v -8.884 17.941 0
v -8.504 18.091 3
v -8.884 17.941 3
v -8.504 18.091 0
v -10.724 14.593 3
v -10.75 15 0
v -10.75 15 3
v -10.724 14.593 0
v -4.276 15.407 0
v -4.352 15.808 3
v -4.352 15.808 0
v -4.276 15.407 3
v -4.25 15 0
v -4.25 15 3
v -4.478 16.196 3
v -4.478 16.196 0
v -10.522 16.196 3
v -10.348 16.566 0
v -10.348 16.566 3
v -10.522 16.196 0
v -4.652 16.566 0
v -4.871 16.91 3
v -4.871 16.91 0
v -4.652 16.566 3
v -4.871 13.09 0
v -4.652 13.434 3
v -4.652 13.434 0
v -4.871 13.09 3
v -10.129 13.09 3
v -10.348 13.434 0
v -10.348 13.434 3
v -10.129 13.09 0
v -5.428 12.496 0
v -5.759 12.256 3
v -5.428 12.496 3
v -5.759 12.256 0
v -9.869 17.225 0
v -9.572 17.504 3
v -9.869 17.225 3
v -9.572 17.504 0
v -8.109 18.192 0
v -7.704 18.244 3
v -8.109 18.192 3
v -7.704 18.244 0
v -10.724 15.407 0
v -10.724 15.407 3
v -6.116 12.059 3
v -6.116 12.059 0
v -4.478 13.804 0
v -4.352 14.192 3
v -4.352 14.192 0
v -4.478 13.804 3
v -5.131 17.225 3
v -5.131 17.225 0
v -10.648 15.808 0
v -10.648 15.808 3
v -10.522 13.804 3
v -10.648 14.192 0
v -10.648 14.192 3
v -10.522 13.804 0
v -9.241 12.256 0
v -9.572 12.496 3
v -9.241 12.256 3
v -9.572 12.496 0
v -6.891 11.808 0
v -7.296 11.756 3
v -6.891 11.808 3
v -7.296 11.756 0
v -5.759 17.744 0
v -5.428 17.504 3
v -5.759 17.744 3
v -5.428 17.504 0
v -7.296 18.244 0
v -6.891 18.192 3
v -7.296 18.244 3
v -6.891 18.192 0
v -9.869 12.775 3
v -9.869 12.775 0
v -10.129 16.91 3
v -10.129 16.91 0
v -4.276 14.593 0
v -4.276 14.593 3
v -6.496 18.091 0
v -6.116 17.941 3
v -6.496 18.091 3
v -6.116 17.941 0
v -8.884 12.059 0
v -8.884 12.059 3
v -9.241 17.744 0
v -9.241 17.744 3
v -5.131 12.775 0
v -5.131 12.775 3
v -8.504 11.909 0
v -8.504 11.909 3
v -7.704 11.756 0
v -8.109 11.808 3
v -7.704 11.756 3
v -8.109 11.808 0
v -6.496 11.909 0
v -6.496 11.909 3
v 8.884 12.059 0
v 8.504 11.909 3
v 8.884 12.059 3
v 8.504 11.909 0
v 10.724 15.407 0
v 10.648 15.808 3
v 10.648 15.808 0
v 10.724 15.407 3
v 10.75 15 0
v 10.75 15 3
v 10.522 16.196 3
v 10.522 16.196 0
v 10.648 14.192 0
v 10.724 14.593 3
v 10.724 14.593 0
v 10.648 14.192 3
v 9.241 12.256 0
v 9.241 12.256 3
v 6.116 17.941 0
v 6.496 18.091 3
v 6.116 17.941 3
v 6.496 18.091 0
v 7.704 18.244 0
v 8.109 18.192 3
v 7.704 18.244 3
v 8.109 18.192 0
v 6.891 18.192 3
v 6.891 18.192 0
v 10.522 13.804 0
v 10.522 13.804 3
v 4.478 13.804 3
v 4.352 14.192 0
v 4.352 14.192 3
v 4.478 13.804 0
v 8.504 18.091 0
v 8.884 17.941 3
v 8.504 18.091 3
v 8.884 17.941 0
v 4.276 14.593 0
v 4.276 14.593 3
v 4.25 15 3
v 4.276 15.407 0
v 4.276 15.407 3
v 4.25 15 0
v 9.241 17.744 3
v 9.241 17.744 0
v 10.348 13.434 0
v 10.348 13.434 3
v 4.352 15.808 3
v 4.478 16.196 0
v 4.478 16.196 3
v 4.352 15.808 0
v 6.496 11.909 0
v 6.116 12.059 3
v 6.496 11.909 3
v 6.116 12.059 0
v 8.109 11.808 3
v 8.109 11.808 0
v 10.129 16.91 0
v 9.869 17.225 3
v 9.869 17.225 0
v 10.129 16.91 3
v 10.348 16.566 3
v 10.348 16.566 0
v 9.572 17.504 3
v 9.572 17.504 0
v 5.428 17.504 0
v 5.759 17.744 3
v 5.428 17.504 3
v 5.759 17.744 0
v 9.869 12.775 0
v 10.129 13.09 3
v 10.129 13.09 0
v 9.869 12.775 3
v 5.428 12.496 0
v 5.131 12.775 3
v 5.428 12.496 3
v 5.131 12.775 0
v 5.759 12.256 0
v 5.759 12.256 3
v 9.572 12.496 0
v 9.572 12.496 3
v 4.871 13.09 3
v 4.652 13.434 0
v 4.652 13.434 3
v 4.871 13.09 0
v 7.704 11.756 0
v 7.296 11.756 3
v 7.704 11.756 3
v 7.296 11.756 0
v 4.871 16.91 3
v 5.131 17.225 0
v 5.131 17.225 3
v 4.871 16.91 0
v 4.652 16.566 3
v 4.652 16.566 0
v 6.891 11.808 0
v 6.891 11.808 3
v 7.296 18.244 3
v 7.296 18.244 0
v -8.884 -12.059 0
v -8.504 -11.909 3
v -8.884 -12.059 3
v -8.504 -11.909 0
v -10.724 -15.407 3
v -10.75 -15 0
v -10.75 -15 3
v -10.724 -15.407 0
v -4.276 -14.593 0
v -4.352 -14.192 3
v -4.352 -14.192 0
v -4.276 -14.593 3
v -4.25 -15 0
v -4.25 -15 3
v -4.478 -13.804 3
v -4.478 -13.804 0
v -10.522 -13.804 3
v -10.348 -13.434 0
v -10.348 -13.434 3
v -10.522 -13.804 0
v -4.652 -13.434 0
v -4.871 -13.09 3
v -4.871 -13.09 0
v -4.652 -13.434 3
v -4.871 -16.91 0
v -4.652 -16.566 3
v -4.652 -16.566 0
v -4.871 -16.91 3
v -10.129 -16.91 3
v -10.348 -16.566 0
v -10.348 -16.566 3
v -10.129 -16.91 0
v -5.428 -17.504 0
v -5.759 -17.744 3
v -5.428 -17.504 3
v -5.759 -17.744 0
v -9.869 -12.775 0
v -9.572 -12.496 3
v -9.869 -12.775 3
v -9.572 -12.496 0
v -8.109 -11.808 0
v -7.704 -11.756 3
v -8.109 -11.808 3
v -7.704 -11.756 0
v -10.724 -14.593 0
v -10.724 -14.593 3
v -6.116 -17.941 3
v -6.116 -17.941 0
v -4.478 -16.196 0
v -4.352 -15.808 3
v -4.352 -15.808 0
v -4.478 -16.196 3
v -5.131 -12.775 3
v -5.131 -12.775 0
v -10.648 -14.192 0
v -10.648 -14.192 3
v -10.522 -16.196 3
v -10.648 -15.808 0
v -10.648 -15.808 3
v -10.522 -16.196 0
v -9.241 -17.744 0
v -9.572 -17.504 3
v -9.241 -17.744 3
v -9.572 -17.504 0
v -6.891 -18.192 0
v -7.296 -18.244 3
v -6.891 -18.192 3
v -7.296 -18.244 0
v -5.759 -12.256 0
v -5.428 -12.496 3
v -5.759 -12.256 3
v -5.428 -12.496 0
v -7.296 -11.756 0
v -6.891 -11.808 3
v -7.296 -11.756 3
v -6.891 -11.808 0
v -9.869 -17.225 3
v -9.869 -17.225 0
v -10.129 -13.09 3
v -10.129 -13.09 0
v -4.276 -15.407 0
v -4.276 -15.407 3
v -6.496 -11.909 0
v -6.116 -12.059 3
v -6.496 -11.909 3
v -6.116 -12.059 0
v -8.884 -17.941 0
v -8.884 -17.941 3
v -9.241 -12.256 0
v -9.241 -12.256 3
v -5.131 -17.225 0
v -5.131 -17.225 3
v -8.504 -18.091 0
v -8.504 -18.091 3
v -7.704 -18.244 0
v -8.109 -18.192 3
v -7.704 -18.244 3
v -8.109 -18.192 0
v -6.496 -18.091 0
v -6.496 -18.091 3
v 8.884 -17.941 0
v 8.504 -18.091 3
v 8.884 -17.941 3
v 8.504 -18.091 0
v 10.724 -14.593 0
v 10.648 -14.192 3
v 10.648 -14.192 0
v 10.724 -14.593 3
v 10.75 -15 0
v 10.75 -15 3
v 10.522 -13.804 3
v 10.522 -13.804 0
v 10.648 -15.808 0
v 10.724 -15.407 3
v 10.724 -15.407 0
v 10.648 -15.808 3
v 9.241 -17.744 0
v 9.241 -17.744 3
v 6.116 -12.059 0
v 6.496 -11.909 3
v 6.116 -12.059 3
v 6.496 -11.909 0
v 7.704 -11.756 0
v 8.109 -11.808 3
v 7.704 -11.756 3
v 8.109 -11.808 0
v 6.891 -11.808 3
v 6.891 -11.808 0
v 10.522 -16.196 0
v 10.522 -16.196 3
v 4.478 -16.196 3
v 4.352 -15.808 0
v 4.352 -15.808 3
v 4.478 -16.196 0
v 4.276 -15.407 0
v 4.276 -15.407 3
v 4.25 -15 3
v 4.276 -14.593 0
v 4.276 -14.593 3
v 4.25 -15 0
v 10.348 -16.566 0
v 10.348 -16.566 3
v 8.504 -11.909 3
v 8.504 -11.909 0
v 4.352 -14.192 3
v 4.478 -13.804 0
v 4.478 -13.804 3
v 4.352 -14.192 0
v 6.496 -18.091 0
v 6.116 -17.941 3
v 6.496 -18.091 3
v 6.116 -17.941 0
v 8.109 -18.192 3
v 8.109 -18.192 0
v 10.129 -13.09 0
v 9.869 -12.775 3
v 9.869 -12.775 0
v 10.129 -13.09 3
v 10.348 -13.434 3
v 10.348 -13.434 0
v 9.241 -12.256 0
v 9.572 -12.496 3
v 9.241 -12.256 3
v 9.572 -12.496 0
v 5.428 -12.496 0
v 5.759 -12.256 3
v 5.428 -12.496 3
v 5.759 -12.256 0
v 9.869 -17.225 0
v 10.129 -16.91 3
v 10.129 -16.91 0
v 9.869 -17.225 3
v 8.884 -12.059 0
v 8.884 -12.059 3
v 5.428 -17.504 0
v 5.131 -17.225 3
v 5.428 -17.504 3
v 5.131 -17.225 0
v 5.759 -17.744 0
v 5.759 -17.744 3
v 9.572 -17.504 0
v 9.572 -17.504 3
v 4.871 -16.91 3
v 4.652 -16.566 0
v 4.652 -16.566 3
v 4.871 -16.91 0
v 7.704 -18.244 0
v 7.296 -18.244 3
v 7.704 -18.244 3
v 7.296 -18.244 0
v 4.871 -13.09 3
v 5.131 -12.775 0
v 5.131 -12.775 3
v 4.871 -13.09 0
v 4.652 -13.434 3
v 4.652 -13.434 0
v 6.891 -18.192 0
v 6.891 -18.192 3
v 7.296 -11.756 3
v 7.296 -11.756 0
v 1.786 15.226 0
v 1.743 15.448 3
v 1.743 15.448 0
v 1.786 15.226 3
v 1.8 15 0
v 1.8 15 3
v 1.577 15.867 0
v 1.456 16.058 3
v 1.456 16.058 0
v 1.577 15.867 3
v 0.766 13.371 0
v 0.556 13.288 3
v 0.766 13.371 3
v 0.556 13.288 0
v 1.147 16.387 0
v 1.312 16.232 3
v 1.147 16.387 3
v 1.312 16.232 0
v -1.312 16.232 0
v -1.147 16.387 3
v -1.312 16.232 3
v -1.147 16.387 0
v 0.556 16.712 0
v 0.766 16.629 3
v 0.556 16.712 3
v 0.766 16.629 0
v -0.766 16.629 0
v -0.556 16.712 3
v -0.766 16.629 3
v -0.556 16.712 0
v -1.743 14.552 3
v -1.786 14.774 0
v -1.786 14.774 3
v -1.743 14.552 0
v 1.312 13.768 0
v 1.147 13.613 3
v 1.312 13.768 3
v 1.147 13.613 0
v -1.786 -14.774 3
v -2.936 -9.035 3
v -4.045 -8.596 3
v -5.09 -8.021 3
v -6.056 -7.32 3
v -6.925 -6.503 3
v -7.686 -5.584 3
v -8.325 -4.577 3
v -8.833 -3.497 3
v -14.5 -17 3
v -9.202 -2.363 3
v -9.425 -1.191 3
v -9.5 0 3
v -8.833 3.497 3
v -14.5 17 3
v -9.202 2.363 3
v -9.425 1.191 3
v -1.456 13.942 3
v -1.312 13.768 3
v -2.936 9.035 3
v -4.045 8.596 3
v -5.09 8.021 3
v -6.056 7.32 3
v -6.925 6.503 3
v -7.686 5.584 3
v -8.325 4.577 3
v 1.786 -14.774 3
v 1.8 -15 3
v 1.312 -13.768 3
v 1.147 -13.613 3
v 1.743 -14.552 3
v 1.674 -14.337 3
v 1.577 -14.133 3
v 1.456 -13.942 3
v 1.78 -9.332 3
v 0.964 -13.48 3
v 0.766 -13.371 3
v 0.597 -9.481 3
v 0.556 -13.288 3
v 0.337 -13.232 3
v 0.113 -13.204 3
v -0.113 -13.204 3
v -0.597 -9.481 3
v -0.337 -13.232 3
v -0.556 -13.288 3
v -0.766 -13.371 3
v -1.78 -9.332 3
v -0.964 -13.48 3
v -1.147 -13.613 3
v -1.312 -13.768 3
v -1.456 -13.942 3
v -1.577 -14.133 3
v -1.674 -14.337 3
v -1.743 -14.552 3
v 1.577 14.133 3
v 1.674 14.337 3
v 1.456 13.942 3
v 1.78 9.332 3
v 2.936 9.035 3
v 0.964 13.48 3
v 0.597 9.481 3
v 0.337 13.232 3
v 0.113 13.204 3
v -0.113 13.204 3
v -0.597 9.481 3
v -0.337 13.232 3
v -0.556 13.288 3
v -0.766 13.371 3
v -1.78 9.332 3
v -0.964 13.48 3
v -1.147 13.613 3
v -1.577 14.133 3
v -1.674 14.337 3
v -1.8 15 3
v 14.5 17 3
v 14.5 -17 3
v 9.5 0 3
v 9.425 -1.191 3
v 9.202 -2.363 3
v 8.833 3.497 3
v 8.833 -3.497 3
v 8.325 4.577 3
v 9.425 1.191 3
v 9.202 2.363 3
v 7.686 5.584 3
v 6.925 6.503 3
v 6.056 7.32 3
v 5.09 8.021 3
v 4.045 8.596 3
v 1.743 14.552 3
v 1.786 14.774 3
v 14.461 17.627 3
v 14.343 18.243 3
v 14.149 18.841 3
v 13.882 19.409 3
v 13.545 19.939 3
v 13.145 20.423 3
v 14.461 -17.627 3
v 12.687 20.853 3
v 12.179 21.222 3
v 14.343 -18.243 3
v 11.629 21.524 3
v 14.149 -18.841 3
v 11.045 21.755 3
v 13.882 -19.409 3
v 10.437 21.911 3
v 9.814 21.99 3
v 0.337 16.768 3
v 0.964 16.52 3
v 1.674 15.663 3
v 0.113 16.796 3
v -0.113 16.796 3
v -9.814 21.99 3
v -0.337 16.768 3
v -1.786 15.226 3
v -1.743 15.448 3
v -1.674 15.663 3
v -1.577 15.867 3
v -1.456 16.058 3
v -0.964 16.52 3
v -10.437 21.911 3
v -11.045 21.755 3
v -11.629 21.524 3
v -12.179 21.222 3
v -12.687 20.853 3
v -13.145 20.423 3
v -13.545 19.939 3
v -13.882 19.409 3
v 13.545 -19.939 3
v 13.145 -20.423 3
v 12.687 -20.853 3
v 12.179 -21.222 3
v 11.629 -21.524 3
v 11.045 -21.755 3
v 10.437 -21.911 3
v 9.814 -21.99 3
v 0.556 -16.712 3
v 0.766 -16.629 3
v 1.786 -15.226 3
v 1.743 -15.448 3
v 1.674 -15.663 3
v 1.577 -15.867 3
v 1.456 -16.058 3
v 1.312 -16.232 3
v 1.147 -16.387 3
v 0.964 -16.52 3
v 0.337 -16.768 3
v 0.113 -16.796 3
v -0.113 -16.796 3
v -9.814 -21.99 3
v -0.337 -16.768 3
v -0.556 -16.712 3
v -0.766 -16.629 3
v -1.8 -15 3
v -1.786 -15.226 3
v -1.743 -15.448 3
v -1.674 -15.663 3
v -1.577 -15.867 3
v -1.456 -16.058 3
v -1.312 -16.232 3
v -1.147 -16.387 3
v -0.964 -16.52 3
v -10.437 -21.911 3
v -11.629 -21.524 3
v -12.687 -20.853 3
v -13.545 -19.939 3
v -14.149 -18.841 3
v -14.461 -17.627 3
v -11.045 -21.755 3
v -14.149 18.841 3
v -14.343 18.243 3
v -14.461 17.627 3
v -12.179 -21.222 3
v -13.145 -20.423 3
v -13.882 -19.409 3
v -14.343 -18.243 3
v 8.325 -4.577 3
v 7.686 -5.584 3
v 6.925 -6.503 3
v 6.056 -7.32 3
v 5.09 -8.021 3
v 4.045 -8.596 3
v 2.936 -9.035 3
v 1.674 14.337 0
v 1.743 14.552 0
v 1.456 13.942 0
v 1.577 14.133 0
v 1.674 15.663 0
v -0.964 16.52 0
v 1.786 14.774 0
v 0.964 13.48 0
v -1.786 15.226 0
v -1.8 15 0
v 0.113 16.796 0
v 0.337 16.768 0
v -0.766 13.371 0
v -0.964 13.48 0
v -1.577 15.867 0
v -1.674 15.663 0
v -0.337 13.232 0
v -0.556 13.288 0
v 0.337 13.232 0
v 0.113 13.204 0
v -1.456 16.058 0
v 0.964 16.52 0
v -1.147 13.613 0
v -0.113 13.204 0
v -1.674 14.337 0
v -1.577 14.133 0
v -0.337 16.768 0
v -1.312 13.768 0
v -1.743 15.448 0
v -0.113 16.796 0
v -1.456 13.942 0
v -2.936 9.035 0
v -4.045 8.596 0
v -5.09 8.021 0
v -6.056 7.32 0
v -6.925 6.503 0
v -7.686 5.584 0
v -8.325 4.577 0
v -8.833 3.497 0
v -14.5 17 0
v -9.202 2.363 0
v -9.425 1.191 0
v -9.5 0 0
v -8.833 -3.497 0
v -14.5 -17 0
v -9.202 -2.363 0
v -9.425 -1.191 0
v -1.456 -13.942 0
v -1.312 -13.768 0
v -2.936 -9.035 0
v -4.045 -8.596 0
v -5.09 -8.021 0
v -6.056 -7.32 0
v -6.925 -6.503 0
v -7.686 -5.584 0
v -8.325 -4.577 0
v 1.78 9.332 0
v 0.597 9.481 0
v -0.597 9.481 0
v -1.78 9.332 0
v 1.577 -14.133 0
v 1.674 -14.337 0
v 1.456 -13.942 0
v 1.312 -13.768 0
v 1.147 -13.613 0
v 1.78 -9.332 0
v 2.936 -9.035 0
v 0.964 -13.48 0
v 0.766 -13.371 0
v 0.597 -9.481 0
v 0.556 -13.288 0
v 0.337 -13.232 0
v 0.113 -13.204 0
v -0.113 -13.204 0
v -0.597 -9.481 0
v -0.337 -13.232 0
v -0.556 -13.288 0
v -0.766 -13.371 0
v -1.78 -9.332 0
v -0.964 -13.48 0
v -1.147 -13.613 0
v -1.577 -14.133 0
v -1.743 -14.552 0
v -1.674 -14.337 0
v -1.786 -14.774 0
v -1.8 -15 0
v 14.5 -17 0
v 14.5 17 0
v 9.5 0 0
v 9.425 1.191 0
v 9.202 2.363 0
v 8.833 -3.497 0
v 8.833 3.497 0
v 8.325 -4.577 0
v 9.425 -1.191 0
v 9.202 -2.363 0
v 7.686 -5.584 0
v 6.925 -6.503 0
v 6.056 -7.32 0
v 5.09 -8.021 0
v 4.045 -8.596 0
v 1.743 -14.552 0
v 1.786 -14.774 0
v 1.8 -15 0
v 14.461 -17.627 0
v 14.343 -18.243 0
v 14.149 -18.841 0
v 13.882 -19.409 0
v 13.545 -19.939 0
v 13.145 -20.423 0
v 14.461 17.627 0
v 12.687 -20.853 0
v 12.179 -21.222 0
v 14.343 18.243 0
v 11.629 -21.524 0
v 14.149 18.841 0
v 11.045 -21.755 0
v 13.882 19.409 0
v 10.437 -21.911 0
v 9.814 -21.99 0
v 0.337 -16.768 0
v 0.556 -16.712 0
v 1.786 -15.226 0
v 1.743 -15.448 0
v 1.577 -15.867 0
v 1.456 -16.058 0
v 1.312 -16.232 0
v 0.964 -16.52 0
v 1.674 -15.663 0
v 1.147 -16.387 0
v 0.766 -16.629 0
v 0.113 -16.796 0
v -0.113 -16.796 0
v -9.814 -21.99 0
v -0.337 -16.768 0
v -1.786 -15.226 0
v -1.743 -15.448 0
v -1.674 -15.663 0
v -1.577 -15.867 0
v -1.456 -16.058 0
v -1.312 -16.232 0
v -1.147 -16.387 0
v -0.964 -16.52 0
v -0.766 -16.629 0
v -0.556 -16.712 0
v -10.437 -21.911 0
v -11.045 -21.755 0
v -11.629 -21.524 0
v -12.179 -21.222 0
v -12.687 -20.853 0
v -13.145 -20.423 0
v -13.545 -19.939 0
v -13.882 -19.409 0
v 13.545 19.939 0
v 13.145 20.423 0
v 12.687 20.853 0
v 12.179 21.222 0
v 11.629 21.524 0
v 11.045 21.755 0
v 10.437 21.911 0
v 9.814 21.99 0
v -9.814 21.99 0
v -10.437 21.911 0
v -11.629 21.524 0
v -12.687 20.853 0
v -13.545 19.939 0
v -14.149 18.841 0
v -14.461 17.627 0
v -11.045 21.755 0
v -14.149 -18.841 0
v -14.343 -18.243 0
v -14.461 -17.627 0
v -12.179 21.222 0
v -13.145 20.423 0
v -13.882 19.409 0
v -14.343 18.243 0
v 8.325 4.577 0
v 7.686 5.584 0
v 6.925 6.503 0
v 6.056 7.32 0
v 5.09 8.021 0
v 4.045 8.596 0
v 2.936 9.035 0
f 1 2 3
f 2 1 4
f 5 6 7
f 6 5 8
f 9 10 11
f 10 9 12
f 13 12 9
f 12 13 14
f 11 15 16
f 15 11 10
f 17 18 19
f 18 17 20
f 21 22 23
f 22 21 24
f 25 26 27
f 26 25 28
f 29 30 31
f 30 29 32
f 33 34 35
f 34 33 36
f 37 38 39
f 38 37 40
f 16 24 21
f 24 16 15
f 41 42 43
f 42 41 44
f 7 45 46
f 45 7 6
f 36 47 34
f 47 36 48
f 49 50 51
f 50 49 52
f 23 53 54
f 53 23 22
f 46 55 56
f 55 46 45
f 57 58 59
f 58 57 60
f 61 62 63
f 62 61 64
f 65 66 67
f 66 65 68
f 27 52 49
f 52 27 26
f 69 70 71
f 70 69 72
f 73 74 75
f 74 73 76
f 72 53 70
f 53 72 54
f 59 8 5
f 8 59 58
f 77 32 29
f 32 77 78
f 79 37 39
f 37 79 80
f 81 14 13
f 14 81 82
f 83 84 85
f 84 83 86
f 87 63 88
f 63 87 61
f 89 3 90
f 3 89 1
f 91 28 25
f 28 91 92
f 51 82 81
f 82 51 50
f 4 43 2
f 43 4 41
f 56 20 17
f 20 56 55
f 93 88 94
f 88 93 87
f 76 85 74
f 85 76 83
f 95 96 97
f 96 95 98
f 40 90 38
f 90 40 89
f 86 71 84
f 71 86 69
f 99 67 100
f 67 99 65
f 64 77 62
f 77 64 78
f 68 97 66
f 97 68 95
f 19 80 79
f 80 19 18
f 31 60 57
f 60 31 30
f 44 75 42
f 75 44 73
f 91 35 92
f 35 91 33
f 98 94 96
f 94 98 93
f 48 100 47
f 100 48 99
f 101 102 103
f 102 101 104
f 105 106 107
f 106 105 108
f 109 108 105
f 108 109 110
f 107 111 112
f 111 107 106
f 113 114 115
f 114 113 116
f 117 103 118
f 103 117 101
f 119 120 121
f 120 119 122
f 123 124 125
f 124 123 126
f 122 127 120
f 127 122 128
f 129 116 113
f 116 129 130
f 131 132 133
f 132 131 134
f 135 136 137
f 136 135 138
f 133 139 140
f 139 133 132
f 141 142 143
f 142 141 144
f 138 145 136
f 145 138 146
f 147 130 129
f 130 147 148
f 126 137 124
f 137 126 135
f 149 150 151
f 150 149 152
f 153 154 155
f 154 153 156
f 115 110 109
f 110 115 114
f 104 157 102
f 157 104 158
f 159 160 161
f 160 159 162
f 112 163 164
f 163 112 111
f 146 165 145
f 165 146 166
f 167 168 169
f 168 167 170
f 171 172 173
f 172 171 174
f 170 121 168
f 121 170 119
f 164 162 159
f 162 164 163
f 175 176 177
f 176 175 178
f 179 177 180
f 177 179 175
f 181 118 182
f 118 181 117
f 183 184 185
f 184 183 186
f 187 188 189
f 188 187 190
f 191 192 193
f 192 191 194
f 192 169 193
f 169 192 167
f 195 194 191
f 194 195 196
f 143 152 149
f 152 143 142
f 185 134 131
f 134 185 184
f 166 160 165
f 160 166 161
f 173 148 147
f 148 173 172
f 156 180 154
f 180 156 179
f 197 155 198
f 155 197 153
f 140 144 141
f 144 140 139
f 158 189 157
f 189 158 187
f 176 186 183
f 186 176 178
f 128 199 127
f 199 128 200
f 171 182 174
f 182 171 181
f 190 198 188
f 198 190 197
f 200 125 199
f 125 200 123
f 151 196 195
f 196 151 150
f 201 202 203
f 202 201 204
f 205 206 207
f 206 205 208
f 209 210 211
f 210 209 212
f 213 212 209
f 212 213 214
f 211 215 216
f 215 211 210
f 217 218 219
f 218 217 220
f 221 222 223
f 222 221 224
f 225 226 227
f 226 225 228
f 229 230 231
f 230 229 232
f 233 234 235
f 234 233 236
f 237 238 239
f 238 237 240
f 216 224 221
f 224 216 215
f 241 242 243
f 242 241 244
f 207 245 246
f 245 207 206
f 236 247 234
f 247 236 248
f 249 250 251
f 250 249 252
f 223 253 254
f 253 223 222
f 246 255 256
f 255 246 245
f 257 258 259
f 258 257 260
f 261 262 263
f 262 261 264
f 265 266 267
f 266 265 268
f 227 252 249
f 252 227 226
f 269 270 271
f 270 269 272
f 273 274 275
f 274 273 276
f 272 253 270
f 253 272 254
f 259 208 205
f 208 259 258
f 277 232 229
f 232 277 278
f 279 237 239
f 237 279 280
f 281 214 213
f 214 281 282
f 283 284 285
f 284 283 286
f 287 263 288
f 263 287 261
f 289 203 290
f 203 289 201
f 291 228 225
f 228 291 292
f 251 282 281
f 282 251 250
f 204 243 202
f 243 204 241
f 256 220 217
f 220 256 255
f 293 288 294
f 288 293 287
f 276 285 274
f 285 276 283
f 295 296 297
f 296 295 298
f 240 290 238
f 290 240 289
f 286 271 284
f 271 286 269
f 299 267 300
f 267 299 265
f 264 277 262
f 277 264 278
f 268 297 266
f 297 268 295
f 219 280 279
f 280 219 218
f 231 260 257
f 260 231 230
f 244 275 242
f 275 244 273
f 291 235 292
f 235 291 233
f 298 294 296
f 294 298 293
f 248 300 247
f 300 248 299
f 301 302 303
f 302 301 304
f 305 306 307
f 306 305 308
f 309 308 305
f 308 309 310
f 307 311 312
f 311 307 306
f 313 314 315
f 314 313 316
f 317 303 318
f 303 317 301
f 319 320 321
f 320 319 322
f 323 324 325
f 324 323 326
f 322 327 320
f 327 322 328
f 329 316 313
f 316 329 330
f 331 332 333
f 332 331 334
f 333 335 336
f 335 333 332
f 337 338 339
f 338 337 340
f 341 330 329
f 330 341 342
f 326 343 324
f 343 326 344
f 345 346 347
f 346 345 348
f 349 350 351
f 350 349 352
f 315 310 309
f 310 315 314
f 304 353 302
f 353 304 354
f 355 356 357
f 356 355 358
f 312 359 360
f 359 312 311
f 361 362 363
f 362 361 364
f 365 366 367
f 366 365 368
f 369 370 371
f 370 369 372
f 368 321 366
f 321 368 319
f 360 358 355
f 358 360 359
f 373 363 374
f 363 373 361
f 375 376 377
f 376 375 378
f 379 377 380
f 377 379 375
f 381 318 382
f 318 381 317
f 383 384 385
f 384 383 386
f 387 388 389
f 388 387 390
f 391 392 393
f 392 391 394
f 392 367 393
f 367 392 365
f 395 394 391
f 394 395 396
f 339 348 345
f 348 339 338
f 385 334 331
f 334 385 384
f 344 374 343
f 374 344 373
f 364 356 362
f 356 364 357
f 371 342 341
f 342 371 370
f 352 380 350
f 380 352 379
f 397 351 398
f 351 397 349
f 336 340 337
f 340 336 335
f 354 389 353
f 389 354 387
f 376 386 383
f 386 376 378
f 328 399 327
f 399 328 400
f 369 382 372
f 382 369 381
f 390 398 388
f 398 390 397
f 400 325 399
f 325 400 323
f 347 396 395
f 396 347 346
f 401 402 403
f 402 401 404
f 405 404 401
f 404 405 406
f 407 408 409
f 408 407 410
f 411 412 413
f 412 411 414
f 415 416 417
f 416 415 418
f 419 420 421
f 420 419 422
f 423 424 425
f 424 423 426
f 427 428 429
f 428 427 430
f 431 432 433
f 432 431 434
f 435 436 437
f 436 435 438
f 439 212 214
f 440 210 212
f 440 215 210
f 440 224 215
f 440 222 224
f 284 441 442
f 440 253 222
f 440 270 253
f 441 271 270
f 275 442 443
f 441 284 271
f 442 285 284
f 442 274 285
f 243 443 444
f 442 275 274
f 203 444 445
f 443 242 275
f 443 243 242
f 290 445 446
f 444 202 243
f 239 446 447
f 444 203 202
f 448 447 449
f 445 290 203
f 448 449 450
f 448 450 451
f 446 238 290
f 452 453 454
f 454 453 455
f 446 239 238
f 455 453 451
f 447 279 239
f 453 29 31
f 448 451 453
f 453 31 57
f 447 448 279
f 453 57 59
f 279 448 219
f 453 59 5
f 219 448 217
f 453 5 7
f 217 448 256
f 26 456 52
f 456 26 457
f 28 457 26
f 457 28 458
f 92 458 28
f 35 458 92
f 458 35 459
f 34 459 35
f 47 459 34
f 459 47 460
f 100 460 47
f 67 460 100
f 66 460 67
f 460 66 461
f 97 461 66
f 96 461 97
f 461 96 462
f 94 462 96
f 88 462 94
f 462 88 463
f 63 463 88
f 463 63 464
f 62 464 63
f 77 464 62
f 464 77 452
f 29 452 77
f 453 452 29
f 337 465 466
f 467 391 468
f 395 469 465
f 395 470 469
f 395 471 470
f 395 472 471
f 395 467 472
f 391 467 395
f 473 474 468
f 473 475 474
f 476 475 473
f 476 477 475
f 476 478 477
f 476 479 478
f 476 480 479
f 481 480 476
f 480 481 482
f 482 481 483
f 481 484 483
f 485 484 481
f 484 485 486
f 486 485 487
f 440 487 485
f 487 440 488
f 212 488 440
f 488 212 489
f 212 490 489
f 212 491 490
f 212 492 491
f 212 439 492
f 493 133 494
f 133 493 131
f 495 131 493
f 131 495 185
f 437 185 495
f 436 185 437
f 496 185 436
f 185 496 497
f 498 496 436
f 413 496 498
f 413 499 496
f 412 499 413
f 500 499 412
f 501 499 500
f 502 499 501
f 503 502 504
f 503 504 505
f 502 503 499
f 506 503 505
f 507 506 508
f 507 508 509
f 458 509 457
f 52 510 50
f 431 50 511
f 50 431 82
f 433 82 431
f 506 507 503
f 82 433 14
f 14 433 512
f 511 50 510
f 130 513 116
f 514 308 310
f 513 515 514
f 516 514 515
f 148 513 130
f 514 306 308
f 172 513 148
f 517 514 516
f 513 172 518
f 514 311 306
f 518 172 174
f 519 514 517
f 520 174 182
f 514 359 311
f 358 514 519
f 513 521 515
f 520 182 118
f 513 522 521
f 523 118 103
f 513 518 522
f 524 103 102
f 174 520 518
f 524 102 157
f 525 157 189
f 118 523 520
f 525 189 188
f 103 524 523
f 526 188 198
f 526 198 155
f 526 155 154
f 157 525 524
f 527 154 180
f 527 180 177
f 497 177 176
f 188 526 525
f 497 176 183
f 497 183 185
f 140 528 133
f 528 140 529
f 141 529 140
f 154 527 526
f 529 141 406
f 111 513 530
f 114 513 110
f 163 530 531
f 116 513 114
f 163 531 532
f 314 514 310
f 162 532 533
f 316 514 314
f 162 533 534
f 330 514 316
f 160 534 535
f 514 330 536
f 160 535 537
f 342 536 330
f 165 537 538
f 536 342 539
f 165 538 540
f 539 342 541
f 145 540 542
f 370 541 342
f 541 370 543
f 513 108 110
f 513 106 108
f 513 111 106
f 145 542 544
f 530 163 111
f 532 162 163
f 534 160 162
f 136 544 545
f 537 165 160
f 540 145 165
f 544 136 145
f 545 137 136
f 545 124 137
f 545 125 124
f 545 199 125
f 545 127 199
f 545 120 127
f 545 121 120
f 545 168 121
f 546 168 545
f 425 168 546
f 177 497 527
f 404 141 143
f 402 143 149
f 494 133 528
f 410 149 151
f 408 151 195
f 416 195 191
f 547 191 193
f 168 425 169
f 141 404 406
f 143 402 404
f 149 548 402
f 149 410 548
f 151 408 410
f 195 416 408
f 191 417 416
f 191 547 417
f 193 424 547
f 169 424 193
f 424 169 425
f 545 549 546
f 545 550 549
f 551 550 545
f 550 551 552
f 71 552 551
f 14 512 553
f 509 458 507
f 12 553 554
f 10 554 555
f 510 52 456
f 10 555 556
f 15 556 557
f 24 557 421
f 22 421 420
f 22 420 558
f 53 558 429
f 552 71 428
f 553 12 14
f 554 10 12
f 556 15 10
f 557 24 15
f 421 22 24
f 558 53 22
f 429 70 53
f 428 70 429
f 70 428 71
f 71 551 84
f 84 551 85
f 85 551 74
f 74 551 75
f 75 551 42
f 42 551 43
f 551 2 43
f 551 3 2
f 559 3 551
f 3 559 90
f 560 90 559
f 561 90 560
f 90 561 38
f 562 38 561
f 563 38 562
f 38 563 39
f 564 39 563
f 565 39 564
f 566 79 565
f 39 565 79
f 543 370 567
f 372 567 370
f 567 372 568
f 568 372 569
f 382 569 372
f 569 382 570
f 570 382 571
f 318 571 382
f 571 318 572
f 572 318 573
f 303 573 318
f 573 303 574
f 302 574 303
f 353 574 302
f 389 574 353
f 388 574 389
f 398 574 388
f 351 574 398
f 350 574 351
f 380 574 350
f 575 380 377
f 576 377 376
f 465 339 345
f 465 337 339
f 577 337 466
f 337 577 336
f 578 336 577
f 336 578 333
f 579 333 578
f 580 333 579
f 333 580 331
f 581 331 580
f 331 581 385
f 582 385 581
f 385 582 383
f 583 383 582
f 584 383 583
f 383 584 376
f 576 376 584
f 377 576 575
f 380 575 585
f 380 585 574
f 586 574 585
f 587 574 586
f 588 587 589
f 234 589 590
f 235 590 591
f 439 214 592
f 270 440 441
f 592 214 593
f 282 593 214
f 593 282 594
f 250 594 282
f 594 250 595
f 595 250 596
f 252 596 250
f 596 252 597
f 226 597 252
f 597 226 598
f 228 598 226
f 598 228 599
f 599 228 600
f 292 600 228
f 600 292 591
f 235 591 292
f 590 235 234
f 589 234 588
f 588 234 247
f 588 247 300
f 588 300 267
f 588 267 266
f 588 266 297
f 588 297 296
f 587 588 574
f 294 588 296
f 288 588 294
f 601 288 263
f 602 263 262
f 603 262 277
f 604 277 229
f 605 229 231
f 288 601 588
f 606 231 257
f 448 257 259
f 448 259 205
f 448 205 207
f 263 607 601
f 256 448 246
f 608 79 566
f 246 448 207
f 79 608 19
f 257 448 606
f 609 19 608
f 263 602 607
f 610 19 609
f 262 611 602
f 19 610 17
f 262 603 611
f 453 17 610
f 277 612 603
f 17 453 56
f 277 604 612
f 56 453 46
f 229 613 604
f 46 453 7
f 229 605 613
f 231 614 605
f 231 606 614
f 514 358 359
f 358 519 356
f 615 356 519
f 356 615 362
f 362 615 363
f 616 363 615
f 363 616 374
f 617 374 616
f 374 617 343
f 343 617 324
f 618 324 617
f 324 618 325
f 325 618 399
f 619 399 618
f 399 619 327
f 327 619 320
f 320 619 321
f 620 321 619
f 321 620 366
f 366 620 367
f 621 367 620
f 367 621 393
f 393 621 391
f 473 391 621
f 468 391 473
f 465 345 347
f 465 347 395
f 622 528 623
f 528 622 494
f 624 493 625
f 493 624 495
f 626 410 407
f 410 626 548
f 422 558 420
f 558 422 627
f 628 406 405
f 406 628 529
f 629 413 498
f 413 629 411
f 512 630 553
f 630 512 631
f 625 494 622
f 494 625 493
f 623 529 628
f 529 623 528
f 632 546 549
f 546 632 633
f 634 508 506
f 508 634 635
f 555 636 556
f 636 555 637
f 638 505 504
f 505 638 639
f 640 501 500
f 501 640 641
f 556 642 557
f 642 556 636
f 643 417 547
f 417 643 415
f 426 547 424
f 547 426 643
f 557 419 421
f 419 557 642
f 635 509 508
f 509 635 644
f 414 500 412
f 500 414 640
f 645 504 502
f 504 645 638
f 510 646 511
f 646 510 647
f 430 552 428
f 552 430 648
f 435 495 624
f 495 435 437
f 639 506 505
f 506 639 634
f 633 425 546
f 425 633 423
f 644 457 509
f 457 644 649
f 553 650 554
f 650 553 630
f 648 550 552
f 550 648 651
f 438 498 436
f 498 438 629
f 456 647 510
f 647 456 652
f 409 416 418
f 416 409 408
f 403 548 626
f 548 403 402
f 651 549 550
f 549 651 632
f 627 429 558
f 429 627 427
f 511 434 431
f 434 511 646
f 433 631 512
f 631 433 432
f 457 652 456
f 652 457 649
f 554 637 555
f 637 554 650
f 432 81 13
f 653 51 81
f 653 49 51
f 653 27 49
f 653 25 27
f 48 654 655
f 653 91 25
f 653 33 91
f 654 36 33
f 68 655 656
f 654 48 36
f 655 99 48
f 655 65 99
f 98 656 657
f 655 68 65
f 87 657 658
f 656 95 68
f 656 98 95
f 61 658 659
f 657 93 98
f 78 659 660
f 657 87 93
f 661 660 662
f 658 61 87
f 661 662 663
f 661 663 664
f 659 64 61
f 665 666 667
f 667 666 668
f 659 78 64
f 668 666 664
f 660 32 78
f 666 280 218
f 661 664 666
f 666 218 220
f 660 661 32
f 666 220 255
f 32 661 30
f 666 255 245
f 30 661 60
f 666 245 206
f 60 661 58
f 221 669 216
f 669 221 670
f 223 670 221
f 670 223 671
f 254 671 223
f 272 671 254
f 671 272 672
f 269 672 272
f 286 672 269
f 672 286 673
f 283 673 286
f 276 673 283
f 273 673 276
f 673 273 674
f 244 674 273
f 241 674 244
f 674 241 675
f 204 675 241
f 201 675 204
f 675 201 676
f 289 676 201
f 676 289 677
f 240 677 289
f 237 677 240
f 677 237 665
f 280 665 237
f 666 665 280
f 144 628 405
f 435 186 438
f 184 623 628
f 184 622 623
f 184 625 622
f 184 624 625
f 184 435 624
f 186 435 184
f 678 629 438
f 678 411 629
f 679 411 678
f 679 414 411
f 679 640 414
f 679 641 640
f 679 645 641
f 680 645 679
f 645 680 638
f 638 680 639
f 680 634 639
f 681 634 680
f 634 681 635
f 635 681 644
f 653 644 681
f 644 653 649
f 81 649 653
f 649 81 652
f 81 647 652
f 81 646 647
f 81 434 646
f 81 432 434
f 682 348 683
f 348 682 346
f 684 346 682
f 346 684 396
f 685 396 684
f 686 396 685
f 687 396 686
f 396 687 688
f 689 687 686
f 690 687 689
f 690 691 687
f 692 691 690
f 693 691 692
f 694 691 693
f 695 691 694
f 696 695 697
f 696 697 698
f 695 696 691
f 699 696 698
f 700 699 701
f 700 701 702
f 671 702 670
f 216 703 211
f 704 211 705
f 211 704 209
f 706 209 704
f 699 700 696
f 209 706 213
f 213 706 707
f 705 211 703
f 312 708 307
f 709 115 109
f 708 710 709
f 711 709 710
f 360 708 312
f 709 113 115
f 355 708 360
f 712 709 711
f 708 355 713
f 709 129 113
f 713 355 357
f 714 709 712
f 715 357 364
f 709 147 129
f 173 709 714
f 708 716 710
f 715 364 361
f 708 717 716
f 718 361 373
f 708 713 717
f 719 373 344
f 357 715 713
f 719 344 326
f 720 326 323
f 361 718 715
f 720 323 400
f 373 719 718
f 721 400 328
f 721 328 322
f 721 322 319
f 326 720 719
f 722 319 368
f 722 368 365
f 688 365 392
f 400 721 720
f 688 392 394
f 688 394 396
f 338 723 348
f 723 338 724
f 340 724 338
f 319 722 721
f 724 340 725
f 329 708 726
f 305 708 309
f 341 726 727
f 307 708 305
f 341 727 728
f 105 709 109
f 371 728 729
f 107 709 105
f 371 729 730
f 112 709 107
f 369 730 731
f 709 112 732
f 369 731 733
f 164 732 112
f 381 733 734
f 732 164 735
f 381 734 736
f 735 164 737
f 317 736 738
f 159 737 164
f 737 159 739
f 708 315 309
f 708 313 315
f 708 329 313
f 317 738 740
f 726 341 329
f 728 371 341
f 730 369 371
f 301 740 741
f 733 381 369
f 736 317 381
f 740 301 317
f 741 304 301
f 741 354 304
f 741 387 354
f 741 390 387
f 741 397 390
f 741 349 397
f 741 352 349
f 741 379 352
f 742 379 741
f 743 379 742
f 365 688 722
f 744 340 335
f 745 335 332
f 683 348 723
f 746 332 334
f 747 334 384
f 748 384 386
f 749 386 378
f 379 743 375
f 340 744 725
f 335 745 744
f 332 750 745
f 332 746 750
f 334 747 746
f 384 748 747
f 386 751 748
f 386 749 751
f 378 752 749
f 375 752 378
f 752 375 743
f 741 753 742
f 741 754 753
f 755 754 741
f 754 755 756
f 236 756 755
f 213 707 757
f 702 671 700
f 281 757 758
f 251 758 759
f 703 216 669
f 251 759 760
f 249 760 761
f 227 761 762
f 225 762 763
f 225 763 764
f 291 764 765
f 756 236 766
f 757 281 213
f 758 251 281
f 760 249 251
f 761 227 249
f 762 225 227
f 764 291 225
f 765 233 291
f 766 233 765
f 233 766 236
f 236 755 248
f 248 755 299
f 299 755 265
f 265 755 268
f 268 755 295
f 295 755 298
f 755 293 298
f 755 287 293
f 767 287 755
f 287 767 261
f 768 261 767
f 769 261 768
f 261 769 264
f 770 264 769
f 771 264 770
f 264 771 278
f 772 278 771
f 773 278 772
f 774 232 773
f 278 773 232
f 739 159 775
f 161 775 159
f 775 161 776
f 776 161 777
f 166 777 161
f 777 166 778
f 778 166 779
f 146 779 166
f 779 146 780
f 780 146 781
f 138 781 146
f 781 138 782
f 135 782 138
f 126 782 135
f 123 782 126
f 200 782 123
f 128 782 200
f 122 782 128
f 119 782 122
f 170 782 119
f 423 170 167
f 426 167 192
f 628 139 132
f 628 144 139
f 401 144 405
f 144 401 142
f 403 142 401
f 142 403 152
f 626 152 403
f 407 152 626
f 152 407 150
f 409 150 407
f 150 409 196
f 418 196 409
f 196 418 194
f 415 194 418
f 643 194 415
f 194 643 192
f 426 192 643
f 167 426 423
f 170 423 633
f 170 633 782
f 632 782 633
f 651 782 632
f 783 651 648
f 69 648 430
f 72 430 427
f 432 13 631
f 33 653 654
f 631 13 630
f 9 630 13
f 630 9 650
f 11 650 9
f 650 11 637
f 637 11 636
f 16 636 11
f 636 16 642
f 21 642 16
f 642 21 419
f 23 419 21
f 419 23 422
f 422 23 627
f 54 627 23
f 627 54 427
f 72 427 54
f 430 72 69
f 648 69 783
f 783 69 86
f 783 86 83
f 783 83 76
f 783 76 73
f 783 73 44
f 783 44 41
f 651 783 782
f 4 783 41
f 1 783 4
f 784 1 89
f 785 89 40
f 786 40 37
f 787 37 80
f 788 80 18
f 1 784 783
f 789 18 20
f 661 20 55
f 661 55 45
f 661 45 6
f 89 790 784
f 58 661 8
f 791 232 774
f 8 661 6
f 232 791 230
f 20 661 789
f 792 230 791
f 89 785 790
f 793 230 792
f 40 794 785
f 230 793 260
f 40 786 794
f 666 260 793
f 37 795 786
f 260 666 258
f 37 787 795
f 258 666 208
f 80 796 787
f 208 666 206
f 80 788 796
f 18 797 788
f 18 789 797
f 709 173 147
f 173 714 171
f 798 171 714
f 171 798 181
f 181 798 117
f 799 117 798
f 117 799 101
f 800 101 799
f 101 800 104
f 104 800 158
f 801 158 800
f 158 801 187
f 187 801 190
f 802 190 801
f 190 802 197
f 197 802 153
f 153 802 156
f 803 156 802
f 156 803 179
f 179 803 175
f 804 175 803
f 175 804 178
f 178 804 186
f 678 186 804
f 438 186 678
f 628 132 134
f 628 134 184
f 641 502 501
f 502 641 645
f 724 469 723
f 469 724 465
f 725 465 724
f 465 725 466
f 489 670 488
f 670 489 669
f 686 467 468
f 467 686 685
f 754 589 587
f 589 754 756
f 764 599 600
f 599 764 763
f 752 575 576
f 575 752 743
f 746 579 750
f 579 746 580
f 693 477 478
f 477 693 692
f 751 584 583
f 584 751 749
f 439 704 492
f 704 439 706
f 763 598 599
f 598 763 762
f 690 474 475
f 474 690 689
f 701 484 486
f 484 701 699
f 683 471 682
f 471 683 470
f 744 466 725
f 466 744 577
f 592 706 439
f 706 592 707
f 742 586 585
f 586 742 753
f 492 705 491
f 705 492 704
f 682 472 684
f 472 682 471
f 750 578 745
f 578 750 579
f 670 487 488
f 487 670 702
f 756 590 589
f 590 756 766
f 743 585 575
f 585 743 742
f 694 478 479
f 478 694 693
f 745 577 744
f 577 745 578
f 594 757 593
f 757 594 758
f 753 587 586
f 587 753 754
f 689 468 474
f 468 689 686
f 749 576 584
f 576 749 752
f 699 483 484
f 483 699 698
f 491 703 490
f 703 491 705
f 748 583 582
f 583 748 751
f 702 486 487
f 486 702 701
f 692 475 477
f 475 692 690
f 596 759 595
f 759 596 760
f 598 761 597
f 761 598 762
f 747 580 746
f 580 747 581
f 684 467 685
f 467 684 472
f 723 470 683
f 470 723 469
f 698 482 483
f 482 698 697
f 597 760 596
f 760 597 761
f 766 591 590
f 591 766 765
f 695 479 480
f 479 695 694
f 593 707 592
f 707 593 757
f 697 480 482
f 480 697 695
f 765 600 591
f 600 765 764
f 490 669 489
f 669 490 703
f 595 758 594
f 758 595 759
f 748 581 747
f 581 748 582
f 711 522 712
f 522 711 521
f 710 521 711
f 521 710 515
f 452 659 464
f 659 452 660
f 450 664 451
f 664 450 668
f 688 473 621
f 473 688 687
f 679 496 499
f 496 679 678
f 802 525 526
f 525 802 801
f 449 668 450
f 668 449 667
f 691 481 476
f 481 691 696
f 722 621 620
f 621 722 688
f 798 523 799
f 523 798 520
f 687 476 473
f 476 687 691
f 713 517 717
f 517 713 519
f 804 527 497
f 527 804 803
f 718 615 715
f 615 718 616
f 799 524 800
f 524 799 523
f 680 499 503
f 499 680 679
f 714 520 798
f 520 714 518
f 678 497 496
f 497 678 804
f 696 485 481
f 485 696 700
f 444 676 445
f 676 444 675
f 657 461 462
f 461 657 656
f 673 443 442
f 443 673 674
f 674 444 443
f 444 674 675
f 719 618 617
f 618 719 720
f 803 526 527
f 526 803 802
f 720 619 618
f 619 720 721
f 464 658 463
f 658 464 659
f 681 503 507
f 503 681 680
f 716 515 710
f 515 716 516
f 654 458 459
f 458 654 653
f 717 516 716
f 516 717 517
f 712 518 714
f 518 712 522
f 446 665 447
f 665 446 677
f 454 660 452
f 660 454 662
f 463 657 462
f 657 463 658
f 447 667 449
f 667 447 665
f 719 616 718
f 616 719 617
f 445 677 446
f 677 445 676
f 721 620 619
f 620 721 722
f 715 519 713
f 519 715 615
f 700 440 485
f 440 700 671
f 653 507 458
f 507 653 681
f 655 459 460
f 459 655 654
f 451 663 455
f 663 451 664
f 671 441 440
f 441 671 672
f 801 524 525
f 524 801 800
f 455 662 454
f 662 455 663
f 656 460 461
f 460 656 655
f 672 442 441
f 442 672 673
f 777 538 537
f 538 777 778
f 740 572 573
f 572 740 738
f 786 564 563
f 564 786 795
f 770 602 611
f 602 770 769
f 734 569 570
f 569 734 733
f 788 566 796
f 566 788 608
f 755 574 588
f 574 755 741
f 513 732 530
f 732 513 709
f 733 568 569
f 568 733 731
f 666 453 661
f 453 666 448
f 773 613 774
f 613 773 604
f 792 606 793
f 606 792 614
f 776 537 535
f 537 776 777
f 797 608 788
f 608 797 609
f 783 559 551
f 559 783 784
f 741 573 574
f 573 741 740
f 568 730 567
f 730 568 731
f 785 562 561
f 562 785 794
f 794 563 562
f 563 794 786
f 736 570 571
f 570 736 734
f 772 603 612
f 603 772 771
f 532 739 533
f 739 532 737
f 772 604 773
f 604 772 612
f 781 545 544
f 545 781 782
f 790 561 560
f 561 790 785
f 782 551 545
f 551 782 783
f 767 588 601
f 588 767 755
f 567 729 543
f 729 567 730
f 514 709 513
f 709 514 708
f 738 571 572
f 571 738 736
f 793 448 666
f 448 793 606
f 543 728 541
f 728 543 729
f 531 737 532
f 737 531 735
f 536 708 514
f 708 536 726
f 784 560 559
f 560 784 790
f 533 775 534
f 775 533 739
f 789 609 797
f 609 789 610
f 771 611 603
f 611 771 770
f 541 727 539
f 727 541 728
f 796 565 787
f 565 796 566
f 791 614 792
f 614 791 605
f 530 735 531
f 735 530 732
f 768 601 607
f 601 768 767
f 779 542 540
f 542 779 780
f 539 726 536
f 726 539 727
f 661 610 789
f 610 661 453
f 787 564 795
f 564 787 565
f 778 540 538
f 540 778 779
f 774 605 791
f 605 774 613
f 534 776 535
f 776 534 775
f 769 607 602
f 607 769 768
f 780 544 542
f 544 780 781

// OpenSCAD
$fn = 50;


difference() {
	union() {
		hull() {
			translate(v = [-9.5000000000, 17.0000000000, 0]) {
				cylinder(h = 3, r = 5);
			}
			translate(v = [9.5000000000, 17.0000000000, 0]) {
				cylinder(h = 3, r = 5);
			}
			translate(v = [-9.5000000000, -17.0000000000, 0]) {
				cylinder(h = 3, r = 5);
			}
			translate(v = [9.5000000000, -17.0000000000, 0]) {
				cylinder(h = 3, r = 5);
			}
		}
	}
	union() {
		#translate(v = [-7.5000000000, 15.0000000000, 0]) {
			cylinder(h = 3, r = 3.2500000000);
		}
		#translate(v = [7.5000000000, 15.0000000000, 0]) {
			cylinder(h = 3, r = 3.2500000000);
		}
		#translate(v = [-7.5000000000, -15.0000000000, 0]) {
			cylinder(h = 3, r = 3.2500000000);
		}
		#translate(v = [7.5000000000, -15.0000000000, 0]) {
			cylinder(h = 3, r = 3.2500000000);
		}
		#translate(v = [-7.5000000000, -15.0000000000, -100.0000000000]) {
			cylinder(h = 200, r = 3.2500000000);
		}
		#translate(v = [-7.5000000000, 15.0000000000, -100.0000000000]) {
			cylinder(h = 200, r = 3.2500000000);
		}
		#translate(v = [7.5000000000, -15.0000000000, -100.0000000000]) {
			cylinder(h = 200, r = 3.2500000000);
		}
		#translate(v = [7.5000000000, 15.0000000000, -100.0000000000]) {
			cylinder(h = 200, r = 3.2500000000);
		}
		#translate(v = [-7.5000000000, 15.0000000000, 0]) {
			cylinder(h = 3, r = 1.8000000000);
		}
		#translate(v = [0.0000000000, 15.0000000000, 0]) {
			cylinder(h = 3, r = 1.8000000000);
		}
		#translate(v = [7.5000000000, 15.0000000000, 0]) {
			cylinder(h = 3, r = 1.8000000000);
		}
		#translate(v = [-7.5000000000, -15.0000000000, 0]) {
			cylinder(h = 3, r = 1.8000000000);
		}
		#translate(v = [0.0000000000, -15.0000000000, 0]) {
			cylinder(h = 3, r = 1.8000000000);
		}
		#translate(v = [7.5000000000, -15.0000000000, 0]) {
			cylinder(h = 3, r = 1.8000000000);
		}
		#translate(v = [-7.5000000000, 15.0000000000, 0]) {
			cylinder(h = 3, r = 1.8000000000);
		}
		#translate(v = [0.0000000000, 15.0000000000, 0]) {
			cylinder(h = 3, r = 1.8000000000);
		}
		#translate(v = [7.5000000000, 15.0000000000, 0]) {
			cylinder(h = 3, r = 1.8000000000);
		}
		#translate(v = [-7.5000000000, -15.0000000000, 0]) {
			cylinder(h = 3, r = 1.8000000000);
		}
		#translate(v = [0.0000000000, -15.0000000000, 0]) {
			cylinder(h = 3, r = 1.8000000000);
		}
		#translate(v = [7.5000000000, -15.0000000000, 0]) {
			cylinder(h = 3, r = 1.8000000000);
		}
		#translate(v = [-7.5000000000, 15.0000000000, 0]) {
			cylinder(h = 3, r = 1.8000000000);
		}
		#translate(v = [0.0000000000, 15.0000000000, 0]) {
			cylinder(h = 3, r = 1.8000000000);
		}
		#translate(v = [7.5000000000, 15.0000000000, 0]) {
			cylinder(h = 3, r = 1.8000000000);
		}
		#translate(v = [-7.5000000000, -15.0000000000, 0]) {
			cylinder(h = 3, r = 1.8000000000);
		}
		#translate(v = [0.0000000000, -15.0000000000, 0]) {
			cylinder(h = 3, r = 1.8000000000);
		}
		#translate(v = [7.5000000000, -15.0000000000, 0]) {
			cylinder(h = 3, r = 1.8000000000);
		}
		#cylinder(h = 3, r = 9.5000000000);
	}
}
